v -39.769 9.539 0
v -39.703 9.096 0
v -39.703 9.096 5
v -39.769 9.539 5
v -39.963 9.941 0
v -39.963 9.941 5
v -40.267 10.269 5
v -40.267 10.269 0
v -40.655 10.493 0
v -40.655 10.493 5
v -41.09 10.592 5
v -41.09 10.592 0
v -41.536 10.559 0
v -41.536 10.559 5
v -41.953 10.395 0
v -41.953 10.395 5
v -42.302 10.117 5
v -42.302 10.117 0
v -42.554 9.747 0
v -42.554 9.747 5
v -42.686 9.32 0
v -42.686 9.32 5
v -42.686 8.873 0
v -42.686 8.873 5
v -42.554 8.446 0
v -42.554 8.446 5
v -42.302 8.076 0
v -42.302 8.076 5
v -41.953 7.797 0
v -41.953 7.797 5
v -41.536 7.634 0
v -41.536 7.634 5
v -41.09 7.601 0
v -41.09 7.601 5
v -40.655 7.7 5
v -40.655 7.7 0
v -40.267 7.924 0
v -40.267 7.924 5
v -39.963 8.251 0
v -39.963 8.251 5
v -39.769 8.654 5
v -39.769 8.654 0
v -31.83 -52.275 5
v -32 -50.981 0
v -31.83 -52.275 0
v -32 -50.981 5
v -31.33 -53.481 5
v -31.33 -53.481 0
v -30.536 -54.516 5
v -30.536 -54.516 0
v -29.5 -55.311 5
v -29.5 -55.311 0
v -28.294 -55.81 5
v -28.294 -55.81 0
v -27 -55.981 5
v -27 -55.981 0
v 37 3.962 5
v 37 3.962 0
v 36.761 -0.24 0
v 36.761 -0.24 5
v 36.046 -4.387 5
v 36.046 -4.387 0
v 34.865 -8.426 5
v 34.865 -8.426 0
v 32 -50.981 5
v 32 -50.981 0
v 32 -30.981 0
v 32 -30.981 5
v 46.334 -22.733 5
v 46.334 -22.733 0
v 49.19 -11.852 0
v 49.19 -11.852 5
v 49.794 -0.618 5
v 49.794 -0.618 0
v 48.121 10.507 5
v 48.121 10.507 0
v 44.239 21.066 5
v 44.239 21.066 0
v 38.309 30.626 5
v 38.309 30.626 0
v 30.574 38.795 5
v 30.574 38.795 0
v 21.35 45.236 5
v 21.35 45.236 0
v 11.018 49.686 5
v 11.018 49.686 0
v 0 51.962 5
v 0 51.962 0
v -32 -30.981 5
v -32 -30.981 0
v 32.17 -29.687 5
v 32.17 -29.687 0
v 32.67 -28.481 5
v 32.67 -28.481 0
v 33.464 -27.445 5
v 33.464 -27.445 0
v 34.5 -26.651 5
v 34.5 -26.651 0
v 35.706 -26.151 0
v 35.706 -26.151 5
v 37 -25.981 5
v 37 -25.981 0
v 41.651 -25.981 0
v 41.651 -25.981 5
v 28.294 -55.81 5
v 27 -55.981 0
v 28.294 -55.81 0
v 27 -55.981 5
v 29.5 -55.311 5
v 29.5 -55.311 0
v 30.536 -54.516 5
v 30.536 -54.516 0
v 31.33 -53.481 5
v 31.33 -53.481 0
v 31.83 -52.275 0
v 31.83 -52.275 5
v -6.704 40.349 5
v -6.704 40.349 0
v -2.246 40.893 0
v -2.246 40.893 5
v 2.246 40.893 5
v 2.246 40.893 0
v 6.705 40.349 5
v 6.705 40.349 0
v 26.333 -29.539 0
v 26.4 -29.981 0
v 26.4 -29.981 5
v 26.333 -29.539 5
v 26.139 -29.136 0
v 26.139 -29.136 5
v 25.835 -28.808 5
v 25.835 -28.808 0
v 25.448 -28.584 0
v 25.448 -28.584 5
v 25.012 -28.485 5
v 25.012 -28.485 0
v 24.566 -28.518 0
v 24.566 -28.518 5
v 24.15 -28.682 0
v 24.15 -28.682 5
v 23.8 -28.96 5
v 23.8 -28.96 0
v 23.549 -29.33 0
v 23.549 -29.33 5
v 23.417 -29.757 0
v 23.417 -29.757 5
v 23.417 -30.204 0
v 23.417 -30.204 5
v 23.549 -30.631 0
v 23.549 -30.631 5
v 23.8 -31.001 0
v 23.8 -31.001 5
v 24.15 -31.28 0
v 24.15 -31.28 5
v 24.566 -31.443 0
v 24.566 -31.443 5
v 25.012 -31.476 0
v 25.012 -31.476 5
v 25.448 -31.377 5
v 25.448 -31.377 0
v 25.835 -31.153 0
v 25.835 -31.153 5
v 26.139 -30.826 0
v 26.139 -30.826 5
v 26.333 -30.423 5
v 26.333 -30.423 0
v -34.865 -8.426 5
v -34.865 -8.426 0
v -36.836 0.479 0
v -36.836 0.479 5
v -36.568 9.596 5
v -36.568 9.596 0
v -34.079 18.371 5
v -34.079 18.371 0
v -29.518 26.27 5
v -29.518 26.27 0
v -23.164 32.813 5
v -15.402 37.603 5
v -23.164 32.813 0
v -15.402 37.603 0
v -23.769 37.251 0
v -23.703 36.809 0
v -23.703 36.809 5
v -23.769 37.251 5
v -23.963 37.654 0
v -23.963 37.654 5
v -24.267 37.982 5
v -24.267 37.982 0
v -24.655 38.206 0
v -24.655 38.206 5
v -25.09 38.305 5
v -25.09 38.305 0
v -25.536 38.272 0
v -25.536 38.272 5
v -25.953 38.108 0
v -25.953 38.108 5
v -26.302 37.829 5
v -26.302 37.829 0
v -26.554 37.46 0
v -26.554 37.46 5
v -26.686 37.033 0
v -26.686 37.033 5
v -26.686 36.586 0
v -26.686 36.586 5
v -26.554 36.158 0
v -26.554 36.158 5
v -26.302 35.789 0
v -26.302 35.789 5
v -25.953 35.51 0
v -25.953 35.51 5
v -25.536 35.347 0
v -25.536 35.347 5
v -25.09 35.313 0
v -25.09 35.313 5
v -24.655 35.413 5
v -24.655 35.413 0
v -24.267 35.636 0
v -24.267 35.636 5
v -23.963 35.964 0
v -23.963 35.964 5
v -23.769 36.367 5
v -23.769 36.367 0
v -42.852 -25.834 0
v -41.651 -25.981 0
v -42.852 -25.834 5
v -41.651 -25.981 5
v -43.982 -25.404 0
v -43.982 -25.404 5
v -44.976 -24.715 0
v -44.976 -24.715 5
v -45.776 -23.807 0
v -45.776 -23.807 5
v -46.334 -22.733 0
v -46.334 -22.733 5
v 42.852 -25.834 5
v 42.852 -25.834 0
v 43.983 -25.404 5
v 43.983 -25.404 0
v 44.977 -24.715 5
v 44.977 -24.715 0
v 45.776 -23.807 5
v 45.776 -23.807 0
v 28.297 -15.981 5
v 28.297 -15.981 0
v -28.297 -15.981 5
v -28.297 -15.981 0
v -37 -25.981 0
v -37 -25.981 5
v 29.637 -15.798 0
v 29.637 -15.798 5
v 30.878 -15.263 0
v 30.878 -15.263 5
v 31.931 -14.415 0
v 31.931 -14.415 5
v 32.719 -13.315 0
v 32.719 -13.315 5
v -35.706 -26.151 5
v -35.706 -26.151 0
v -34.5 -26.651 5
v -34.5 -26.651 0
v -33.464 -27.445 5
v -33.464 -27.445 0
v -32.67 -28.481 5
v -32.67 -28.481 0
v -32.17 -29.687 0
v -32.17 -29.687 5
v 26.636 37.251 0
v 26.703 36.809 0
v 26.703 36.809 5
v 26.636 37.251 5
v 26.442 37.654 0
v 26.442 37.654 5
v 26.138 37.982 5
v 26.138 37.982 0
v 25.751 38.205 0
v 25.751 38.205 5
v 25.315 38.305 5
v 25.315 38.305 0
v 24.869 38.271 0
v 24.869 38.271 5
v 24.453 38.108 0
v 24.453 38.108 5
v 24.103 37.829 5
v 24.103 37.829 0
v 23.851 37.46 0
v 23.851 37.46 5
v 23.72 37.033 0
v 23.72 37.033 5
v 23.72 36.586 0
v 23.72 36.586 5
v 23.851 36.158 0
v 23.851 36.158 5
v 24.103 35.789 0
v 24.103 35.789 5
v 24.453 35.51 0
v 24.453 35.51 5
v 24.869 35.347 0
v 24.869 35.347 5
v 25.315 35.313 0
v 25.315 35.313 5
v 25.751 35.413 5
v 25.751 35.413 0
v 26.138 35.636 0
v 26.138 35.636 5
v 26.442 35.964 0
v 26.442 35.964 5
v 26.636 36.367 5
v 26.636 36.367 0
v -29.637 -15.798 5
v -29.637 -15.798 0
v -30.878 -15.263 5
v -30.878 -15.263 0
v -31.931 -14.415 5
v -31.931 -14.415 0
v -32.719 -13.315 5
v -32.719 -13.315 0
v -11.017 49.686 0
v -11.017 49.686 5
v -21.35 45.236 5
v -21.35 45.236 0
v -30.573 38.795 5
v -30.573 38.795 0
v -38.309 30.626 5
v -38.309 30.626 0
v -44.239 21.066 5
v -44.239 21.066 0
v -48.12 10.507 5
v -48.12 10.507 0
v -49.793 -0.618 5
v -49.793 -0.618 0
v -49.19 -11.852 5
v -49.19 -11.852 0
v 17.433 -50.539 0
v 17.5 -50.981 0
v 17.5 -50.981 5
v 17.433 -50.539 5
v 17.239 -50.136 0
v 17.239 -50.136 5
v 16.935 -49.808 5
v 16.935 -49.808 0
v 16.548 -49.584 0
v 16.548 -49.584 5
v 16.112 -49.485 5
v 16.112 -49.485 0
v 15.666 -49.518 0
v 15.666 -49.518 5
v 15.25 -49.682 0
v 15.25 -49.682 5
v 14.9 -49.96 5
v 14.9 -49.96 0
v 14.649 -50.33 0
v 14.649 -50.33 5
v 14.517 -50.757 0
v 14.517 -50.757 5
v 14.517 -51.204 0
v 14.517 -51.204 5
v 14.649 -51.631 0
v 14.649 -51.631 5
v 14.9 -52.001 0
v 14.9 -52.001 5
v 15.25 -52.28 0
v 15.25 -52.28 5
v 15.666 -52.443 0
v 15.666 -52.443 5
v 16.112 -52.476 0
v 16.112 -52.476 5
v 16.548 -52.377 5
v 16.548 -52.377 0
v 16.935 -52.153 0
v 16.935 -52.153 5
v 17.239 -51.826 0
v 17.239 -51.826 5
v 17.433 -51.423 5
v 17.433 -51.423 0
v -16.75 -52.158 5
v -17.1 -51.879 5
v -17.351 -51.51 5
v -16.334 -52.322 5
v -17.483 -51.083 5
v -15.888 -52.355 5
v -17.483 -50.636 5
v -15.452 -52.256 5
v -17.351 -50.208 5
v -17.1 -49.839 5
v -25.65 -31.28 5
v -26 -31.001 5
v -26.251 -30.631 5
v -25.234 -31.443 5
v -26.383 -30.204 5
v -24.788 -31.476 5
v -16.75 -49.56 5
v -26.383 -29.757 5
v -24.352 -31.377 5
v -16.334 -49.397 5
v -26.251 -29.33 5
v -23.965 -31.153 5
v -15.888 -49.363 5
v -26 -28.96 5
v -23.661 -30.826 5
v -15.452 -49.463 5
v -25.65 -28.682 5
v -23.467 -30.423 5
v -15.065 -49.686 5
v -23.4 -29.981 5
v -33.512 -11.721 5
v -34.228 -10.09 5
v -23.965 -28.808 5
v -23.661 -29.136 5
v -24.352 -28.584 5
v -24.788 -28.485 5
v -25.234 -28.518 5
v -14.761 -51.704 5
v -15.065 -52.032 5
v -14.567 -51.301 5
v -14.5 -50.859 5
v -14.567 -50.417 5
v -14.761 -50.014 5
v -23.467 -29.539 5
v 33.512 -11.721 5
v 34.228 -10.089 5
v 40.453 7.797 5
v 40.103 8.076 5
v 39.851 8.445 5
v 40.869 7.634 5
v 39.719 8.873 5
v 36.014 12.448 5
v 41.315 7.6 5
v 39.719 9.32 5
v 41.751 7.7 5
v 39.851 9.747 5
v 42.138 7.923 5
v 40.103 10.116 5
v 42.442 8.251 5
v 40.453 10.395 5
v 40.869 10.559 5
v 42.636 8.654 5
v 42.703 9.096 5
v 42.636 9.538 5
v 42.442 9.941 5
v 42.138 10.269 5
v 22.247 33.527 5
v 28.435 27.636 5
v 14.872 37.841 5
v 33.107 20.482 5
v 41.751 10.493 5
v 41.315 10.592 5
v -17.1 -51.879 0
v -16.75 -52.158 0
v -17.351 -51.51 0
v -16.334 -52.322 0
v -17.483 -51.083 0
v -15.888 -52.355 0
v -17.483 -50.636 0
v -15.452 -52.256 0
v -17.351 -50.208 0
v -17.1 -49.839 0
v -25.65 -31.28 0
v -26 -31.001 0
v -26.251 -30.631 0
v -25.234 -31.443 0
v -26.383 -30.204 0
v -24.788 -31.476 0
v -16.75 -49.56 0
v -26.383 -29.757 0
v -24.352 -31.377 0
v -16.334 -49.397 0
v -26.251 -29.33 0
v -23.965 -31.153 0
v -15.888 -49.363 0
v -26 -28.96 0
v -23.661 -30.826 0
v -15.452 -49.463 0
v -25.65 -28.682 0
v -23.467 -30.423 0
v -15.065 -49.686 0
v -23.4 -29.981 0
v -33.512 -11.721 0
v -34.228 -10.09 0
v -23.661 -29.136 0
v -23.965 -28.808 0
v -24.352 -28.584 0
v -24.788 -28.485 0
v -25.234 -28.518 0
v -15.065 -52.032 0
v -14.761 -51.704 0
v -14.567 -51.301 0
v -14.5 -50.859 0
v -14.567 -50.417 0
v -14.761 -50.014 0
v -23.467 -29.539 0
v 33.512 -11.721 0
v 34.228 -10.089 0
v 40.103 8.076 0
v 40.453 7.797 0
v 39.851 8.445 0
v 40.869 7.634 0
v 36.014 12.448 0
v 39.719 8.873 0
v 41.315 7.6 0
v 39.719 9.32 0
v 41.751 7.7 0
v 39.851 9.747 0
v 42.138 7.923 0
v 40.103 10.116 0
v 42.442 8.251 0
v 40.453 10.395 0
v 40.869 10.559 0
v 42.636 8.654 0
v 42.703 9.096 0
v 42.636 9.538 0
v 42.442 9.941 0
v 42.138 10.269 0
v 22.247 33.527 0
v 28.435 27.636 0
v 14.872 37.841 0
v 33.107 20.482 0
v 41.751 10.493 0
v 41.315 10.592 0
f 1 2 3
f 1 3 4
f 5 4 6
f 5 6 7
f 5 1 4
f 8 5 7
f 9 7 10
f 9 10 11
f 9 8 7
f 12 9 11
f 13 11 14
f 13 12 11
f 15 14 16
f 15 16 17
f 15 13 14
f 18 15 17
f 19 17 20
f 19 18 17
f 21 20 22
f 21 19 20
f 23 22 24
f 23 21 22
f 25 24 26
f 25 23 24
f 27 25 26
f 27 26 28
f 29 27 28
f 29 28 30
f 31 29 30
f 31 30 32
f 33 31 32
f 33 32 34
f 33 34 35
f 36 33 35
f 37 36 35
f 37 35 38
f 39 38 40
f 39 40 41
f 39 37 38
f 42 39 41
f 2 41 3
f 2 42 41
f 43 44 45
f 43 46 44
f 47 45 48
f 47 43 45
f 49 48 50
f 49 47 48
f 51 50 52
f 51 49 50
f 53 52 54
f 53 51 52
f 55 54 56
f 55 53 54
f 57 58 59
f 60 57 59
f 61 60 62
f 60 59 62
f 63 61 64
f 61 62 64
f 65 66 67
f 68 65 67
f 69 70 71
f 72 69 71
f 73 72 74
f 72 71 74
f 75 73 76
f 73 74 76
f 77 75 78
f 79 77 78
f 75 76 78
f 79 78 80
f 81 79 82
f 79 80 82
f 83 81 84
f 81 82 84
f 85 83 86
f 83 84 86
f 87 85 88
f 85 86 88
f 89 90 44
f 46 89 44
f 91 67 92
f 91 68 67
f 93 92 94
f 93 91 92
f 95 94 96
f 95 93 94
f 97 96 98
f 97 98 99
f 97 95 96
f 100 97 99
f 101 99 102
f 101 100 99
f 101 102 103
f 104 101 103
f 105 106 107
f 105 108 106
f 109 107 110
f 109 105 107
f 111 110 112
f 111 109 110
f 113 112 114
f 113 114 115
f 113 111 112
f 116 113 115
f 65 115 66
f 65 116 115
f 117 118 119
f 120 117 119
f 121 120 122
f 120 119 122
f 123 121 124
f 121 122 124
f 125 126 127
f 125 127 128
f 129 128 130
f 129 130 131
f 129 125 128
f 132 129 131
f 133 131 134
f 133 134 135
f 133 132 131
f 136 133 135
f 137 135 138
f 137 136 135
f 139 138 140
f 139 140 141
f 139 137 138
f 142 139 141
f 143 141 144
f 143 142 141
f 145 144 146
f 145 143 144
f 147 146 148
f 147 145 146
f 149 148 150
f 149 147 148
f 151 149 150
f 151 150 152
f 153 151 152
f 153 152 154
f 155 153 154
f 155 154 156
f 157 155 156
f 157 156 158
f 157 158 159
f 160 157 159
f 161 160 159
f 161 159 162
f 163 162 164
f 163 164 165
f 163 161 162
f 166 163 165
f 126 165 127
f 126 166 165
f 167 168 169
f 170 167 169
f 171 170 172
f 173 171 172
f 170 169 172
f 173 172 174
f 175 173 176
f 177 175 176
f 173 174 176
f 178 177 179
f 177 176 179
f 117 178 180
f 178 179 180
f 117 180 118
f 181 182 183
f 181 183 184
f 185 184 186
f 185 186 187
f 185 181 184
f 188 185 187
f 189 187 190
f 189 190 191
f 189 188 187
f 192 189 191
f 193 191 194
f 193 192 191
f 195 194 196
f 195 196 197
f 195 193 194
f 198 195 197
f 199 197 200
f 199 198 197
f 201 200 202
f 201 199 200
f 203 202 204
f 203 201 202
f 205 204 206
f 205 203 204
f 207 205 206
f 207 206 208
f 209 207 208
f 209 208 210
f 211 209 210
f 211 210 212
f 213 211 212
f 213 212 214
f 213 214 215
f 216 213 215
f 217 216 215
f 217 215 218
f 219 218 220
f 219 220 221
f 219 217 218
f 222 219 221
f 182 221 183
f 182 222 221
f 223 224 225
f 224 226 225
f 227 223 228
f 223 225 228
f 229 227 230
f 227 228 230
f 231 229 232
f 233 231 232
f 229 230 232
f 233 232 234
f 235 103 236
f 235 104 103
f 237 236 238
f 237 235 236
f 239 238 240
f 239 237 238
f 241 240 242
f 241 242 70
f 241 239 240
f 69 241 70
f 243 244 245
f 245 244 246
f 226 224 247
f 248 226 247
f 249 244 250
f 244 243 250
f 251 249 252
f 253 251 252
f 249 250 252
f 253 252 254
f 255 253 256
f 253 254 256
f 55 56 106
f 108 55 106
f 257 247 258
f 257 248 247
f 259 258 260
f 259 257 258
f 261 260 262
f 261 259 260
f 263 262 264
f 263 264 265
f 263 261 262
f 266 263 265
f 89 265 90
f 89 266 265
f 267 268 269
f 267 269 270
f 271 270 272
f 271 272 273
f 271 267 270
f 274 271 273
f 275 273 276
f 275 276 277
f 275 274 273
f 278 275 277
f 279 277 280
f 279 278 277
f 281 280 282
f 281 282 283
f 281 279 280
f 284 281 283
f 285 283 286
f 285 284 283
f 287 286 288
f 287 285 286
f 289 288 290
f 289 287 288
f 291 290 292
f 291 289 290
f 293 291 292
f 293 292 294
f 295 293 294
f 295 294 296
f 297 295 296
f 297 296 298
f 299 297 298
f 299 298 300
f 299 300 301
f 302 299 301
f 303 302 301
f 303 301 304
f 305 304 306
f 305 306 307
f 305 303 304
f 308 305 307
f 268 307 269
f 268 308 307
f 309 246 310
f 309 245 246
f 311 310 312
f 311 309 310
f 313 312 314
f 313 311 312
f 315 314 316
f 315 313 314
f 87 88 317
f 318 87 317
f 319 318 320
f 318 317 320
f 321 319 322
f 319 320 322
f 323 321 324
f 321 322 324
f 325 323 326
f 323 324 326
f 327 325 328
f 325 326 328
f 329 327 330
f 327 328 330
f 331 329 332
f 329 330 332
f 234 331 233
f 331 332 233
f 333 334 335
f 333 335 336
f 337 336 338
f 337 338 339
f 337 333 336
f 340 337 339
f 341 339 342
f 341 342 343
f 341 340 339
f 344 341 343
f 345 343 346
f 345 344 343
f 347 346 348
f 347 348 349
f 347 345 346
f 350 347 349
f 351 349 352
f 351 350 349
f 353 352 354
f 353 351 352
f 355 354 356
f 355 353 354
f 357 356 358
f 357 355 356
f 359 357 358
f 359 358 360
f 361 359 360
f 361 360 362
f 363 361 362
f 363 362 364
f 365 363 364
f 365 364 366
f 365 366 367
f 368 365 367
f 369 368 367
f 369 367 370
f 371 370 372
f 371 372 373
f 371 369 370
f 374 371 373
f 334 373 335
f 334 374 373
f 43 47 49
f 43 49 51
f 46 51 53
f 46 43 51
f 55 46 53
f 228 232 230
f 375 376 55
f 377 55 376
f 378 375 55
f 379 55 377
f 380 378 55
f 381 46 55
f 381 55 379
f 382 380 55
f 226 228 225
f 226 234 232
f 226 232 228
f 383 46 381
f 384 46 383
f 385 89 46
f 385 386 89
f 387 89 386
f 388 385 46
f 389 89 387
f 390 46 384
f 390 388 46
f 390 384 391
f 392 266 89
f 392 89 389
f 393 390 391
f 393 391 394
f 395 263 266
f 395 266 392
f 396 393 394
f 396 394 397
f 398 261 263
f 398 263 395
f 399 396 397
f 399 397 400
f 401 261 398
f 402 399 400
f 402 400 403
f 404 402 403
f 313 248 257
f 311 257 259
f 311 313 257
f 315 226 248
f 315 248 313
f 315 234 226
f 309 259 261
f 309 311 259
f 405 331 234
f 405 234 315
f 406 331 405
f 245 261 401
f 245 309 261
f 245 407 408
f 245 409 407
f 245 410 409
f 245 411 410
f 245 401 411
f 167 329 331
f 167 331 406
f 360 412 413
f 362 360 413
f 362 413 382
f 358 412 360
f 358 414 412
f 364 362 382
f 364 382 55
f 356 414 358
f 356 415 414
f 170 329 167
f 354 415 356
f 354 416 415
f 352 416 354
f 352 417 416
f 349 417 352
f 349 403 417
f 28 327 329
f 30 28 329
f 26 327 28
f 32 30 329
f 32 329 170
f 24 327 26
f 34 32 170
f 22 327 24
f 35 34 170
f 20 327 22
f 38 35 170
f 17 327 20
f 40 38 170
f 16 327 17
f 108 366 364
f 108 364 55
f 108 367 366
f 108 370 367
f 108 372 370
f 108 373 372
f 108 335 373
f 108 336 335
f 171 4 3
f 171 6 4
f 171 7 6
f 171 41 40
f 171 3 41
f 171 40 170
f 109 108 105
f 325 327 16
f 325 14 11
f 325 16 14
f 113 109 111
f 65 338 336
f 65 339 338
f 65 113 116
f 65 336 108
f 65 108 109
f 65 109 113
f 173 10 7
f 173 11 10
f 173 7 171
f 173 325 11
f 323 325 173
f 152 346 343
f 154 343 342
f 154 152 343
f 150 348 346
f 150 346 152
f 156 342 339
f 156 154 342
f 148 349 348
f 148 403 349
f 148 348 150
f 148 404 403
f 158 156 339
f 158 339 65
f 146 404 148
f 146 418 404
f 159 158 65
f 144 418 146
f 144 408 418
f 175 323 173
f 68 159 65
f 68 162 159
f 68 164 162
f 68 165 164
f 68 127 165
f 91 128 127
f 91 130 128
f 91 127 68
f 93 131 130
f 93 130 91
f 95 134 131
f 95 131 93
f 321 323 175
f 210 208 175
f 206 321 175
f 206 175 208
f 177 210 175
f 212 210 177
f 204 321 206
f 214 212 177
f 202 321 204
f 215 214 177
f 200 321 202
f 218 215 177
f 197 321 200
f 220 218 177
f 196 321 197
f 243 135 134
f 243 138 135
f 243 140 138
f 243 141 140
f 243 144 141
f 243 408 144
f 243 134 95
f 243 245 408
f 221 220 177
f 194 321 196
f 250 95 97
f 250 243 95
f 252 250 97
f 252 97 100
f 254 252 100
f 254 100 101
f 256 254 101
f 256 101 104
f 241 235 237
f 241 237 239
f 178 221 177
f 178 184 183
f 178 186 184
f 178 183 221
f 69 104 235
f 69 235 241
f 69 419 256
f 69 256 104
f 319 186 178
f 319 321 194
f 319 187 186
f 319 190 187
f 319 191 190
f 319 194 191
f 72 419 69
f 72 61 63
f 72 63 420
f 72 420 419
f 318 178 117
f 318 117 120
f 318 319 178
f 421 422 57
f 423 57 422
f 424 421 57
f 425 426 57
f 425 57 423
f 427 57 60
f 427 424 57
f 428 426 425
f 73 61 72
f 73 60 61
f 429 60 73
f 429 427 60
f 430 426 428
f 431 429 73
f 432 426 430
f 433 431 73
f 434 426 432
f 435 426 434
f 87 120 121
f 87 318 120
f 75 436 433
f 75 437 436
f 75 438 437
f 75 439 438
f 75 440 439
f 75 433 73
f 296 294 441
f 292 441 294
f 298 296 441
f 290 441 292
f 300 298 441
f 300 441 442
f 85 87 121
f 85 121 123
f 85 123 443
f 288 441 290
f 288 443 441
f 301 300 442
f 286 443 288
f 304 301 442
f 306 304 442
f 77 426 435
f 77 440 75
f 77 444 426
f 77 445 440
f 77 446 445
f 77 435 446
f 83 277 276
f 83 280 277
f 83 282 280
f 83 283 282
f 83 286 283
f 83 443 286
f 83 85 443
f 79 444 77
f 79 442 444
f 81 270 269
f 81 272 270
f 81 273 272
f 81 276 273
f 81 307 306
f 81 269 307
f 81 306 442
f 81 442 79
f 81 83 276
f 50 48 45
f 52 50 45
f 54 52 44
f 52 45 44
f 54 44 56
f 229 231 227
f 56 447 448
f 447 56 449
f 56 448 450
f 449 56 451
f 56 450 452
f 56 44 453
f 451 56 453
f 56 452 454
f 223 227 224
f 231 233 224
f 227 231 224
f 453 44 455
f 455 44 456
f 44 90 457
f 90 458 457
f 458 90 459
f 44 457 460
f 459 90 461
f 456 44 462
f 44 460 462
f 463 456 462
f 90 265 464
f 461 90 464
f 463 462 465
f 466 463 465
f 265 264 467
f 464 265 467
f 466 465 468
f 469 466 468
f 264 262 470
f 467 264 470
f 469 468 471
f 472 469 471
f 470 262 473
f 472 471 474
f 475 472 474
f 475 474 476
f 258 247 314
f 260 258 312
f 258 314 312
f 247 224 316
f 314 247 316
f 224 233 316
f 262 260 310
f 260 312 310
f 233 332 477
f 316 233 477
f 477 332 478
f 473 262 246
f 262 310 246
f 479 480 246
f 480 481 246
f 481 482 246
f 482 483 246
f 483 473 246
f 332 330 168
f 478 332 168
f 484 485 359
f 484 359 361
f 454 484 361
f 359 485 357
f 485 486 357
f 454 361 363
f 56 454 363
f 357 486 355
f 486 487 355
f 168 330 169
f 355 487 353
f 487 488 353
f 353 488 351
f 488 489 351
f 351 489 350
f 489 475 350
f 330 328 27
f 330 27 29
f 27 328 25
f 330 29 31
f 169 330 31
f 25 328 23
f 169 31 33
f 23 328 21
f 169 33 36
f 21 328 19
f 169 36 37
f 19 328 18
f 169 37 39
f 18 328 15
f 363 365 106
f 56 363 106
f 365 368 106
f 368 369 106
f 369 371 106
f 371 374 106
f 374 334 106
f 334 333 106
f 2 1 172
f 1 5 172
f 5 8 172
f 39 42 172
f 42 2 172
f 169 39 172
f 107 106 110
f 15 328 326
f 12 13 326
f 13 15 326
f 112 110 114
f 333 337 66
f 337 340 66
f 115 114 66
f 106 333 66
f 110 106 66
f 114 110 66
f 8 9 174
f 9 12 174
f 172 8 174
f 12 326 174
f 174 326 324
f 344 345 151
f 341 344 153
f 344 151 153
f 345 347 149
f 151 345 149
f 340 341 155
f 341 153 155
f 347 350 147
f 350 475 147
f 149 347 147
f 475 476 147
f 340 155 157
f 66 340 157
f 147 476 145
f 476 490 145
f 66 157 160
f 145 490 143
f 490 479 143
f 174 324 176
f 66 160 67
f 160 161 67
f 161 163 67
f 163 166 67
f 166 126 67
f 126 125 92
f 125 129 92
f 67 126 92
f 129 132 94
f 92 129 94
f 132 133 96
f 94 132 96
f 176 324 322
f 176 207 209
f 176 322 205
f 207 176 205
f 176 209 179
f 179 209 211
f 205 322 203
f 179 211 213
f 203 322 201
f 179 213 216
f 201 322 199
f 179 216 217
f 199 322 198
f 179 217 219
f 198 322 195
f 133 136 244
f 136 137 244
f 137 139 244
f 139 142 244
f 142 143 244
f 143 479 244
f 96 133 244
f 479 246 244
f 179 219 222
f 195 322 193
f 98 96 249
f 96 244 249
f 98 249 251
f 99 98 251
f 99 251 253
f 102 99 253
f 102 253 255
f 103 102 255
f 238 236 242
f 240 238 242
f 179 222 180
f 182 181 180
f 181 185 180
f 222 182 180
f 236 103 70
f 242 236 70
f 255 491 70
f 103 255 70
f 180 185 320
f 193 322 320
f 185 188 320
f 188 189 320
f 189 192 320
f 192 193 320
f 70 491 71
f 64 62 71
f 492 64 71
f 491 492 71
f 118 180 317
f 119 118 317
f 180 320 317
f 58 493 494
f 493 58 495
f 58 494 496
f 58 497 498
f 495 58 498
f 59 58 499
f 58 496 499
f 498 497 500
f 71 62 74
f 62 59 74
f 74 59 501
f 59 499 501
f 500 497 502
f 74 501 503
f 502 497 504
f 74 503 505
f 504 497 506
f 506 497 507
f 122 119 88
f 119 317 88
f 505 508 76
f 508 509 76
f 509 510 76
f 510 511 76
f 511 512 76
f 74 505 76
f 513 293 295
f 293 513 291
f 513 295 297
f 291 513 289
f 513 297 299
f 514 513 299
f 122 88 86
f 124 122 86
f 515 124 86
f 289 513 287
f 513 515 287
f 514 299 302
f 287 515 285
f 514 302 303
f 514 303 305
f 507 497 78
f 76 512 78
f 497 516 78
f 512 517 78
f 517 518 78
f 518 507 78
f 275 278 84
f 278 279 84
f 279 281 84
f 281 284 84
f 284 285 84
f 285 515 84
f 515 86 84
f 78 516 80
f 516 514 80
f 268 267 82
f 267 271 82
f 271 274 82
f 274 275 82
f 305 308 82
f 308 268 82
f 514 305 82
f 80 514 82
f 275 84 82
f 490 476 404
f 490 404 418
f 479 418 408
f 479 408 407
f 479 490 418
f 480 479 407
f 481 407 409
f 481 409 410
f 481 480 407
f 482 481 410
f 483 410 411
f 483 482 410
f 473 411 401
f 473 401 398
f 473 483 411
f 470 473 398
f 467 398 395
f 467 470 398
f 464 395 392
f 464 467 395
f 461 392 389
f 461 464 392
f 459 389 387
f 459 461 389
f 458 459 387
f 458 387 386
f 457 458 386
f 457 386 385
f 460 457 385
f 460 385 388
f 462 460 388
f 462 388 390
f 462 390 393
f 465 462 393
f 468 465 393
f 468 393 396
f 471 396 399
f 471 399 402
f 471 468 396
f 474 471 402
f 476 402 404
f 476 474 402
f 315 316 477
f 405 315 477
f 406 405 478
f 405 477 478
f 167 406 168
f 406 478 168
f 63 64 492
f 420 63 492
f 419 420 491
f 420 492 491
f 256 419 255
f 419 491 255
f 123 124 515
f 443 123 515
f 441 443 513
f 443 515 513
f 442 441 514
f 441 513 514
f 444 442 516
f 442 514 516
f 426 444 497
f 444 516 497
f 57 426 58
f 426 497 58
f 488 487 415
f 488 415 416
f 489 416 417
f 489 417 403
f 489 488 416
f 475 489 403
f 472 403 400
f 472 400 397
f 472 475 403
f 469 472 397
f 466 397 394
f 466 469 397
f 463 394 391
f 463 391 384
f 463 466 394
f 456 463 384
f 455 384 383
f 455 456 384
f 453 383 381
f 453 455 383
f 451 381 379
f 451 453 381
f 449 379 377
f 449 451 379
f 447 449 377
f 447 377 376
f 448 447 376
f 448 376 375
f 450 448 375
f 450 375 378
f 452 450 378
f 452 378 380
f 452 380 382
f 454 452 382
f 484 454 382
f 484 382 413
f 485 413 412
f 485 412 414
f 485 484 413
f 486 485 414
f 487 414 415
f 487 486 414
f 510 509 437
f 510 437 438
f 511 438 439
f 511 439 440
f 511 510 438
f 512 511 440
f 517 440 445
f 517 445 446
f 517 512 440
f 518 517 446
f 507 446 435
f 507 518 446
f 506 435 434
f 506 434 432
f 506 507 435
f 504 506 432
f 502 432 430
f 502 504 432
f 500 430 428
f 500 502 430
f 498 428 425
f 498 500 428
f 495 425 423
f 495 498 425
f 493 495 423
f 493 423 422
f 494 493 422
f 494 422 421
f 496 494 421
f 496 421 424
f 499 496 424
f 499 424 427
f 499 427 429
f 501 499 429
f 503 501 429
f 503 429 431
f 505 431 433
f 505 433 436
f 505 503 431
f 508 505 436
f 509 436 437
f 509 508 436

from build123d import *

# Parameters (mm, degrees)
F0_R     = 1.5
F1_DEPTH = 5
F2_R     = 5


# Not quite as in the source:
# - a feature names something its author has since deleted; it is built from what else it names


with BuildPart() as f1:
    # F0 (on Top) → F1 (new body)
    with BuildSketch(Plane.XY):
        with BuildLine():
            Line((32, -25.9806431703), (45.0002060157, -25.9806431703))
            Line((45.0002060157, -25.9806431703), (34.8648160141, -8.425632733))
            ThreePointArc((34.8648160141, -8.425632733), (33.2306953855, -12.3086021935), (31.1657699329, -15.9806431703))
            Line((31.1657699329, -15.9806431703), (32, -15.9806431703))
            Line((32, -15.9806431703), (32, -25.9806431703))
        make_face()
        with BuildLine():
            Line((34.8648160141, -8.425632733), (45.0002060157, -25.9806431703))
            ThreePointArc((45.0002060157, -25.9806431703), (42.4187903028, 24.4905), (0.0002060157, 51.9616431703))
            Line((0.0002060157, 51.9616431703), (6.7047123911, 40.3490974884))
            ThreePointArc((6.7047123911, 40.3490974884), (28.4347881869, 27.6357391565), (37, 3.9616431703))
            ThreePointArc((37, 3.9616431703), (36.4622969142, -2.3233312719), (34.8648160141, -8.425632733))
        make_face()
        with Locations((41.2026322213, 9.0961922878)):
            Circle(F0_R, mode=Mode.SUBTRACT)
        with Locations((25.2027902051, 36.8090964203)):
            Circle(F0_R, mode=Mode.SUBTRACT)
        with BuildLine():
            Line((32, -55.9806431703), (32, -25.9806431703))
            Line((32, -25.9806431703), (21.7361332508, -25.9806431703))
            ThreePointArc((21.7361332508, -25.9806431703), (0, -33.0383568297), (-21.7361332508, -25.9806431703))
            Line((-21.7361332508, -25.9806431703), (-32, -25.9806431703))
            Line((-32, -25.9806431703), (-32, -55.9806431703))
            Line((-32, -55.9806431703), (32, -55.9806431703))
        make_face()
        with Locations((-16, -50.8592247836)):
            Circle(F0_R, mode=Mode.SUBTRACT)
        with Locations((-24.9, -29.9806431703)):
            Circle(F0_R, mode=Mode.SUBTRACT)
        with Locations((16, -50.9806431703)):
            Circle(F0_R, mode=Mode.SUBTRACT)
        with Locations((24.9, -29.9806431703)):
            Circle(F0_R, mode=Mode.SUBTRACT)
        with BuildLine():
            Line((21.7361332508, -25.9806431703), (32, -25.9806431703))
            Line((32, -25.9806431703), (32, -15.9806431703))
            Line((32, -15.9806431703), (31.1657699329, -15.9806431703))
            ThreePointArc((31.1657699329, -15.9806431703), (26.9193766665, -21.422350997), (21.7361332508, -25.9806431703))
        make_face()
        with BuildLine():
            Line((6.7047123911, 40.3490974884), (0.0002060157, 51.9616431703))
            Line((0.0002060157, 51.9616431703), (-6.7042513108, 40.3491824435))
            ThreePointArc((-6.7042513108, 40.3491824435), (0.0002344208, 40.9616431696), (6.7047123911, 40.3490974884))
        make_face()
        with BuildLine():
            Line((-6.7042513108, 40.3491824435), (0.0002060157, 51.9616431703))
            ThreePointArc((0.0002060157, 51.9616431703), (-42.4183782713, 24.4905), (-44.9997939843, -25.9806431703))
            Line((-44.9997939843, -25.9806431703), (-34.8646590472, -8.4260745178))
            ThreePointArc((-34.8646590472, -8.4260745178), (-32.04293994, 22.4616431703), (-6.7042513108, 40.3491824435))
        make_face()
        with Locations((-41.202520651, 9.0964271731)):
            Circle(F0_R, mode=Mode.SUBTRACT)
        with Locations((-25.202520651, 36.8092400942)):
            Circle(F0_R, mode=Mode.SUBTRACT)
        with BuildLine():
            ThreePointArc((-21.7361332508, -25.9806431703), (0, -33.0383568297), (21.7361332508, -25.9806431703))
            Line((21.7361332508, -25.9806431703), (-21.7361332508, -25.9806431703))
        make_face()
        with BuildLine():
            Line((-21.7361332508, -25.9806431703), (21.7361332508, -25.9806431703))
            ThreePointArc((21.7361332508, -25.9806431703), (26.9193766665, -21.422350997), (31.1657699329, -15.9806431703))
            Line((31.1657699329, -15.9806431703), (-31.1657699329, -15.9806431703))
            ThreePointArc((-31.1657699329, -15.9806431703), (-26.9193766665, -21.422350997), (-21.7361332508, -25.9806431703))
        make_face()
        with BuildLine():
            Line((-34.8646590472, -8.4260745178), (-44.9997939843, -25.9806431703))
            Line((-44.9997939843, -25.9806431703), (-32, -25.9806431703))
            Line((-32, -25.9806431703), (-32, -15.9806431703))
            Line((-32, -15.9806431703), (-31.1657699329, -15.9806431703))
            ThreePointArc((-31.1657699329, -15.9806431703), (-33.2305923015, -12.3088127328), (-34.8646590472, -8.4260745178))
        make_face()
        with BuildLine():
            Line((-32, -25.9806431703), (-21.7361332508, -25.9806431703))
            ThreePointArc((-21.7361332508, -25.9806431703), (-26.9193766665, -21.422350997), (-31.1657699329, -15.9806431703))
            Line((-31.1657699329, -15.9806431703), (-32, -15.9806431703))
            Line((-32, -15.9806431703), (-32, -25.9806431703))
        make_face()
    extrude(amount=F1_DEPTH)

    # F2
    f2_edges = [f1.edges().sort_by_distance(p)[0] for p in [
        (-32, -25.980643, 2.5),
        (-44.999794, -25.980643, 2.5),
        (32, -25.980643, 2.5),
        (45.000206, -25.980643, 2.5),
        (-32, -55.980643, 2.5),
        (32, -55.980643, 2.5),
        (-31.16577, -15.980643, 2.5),
        (31.16577, -15.980643, 2.5),
    ]]
    fillet(f2_edges, radius=F2_R)


solid = f1.part
